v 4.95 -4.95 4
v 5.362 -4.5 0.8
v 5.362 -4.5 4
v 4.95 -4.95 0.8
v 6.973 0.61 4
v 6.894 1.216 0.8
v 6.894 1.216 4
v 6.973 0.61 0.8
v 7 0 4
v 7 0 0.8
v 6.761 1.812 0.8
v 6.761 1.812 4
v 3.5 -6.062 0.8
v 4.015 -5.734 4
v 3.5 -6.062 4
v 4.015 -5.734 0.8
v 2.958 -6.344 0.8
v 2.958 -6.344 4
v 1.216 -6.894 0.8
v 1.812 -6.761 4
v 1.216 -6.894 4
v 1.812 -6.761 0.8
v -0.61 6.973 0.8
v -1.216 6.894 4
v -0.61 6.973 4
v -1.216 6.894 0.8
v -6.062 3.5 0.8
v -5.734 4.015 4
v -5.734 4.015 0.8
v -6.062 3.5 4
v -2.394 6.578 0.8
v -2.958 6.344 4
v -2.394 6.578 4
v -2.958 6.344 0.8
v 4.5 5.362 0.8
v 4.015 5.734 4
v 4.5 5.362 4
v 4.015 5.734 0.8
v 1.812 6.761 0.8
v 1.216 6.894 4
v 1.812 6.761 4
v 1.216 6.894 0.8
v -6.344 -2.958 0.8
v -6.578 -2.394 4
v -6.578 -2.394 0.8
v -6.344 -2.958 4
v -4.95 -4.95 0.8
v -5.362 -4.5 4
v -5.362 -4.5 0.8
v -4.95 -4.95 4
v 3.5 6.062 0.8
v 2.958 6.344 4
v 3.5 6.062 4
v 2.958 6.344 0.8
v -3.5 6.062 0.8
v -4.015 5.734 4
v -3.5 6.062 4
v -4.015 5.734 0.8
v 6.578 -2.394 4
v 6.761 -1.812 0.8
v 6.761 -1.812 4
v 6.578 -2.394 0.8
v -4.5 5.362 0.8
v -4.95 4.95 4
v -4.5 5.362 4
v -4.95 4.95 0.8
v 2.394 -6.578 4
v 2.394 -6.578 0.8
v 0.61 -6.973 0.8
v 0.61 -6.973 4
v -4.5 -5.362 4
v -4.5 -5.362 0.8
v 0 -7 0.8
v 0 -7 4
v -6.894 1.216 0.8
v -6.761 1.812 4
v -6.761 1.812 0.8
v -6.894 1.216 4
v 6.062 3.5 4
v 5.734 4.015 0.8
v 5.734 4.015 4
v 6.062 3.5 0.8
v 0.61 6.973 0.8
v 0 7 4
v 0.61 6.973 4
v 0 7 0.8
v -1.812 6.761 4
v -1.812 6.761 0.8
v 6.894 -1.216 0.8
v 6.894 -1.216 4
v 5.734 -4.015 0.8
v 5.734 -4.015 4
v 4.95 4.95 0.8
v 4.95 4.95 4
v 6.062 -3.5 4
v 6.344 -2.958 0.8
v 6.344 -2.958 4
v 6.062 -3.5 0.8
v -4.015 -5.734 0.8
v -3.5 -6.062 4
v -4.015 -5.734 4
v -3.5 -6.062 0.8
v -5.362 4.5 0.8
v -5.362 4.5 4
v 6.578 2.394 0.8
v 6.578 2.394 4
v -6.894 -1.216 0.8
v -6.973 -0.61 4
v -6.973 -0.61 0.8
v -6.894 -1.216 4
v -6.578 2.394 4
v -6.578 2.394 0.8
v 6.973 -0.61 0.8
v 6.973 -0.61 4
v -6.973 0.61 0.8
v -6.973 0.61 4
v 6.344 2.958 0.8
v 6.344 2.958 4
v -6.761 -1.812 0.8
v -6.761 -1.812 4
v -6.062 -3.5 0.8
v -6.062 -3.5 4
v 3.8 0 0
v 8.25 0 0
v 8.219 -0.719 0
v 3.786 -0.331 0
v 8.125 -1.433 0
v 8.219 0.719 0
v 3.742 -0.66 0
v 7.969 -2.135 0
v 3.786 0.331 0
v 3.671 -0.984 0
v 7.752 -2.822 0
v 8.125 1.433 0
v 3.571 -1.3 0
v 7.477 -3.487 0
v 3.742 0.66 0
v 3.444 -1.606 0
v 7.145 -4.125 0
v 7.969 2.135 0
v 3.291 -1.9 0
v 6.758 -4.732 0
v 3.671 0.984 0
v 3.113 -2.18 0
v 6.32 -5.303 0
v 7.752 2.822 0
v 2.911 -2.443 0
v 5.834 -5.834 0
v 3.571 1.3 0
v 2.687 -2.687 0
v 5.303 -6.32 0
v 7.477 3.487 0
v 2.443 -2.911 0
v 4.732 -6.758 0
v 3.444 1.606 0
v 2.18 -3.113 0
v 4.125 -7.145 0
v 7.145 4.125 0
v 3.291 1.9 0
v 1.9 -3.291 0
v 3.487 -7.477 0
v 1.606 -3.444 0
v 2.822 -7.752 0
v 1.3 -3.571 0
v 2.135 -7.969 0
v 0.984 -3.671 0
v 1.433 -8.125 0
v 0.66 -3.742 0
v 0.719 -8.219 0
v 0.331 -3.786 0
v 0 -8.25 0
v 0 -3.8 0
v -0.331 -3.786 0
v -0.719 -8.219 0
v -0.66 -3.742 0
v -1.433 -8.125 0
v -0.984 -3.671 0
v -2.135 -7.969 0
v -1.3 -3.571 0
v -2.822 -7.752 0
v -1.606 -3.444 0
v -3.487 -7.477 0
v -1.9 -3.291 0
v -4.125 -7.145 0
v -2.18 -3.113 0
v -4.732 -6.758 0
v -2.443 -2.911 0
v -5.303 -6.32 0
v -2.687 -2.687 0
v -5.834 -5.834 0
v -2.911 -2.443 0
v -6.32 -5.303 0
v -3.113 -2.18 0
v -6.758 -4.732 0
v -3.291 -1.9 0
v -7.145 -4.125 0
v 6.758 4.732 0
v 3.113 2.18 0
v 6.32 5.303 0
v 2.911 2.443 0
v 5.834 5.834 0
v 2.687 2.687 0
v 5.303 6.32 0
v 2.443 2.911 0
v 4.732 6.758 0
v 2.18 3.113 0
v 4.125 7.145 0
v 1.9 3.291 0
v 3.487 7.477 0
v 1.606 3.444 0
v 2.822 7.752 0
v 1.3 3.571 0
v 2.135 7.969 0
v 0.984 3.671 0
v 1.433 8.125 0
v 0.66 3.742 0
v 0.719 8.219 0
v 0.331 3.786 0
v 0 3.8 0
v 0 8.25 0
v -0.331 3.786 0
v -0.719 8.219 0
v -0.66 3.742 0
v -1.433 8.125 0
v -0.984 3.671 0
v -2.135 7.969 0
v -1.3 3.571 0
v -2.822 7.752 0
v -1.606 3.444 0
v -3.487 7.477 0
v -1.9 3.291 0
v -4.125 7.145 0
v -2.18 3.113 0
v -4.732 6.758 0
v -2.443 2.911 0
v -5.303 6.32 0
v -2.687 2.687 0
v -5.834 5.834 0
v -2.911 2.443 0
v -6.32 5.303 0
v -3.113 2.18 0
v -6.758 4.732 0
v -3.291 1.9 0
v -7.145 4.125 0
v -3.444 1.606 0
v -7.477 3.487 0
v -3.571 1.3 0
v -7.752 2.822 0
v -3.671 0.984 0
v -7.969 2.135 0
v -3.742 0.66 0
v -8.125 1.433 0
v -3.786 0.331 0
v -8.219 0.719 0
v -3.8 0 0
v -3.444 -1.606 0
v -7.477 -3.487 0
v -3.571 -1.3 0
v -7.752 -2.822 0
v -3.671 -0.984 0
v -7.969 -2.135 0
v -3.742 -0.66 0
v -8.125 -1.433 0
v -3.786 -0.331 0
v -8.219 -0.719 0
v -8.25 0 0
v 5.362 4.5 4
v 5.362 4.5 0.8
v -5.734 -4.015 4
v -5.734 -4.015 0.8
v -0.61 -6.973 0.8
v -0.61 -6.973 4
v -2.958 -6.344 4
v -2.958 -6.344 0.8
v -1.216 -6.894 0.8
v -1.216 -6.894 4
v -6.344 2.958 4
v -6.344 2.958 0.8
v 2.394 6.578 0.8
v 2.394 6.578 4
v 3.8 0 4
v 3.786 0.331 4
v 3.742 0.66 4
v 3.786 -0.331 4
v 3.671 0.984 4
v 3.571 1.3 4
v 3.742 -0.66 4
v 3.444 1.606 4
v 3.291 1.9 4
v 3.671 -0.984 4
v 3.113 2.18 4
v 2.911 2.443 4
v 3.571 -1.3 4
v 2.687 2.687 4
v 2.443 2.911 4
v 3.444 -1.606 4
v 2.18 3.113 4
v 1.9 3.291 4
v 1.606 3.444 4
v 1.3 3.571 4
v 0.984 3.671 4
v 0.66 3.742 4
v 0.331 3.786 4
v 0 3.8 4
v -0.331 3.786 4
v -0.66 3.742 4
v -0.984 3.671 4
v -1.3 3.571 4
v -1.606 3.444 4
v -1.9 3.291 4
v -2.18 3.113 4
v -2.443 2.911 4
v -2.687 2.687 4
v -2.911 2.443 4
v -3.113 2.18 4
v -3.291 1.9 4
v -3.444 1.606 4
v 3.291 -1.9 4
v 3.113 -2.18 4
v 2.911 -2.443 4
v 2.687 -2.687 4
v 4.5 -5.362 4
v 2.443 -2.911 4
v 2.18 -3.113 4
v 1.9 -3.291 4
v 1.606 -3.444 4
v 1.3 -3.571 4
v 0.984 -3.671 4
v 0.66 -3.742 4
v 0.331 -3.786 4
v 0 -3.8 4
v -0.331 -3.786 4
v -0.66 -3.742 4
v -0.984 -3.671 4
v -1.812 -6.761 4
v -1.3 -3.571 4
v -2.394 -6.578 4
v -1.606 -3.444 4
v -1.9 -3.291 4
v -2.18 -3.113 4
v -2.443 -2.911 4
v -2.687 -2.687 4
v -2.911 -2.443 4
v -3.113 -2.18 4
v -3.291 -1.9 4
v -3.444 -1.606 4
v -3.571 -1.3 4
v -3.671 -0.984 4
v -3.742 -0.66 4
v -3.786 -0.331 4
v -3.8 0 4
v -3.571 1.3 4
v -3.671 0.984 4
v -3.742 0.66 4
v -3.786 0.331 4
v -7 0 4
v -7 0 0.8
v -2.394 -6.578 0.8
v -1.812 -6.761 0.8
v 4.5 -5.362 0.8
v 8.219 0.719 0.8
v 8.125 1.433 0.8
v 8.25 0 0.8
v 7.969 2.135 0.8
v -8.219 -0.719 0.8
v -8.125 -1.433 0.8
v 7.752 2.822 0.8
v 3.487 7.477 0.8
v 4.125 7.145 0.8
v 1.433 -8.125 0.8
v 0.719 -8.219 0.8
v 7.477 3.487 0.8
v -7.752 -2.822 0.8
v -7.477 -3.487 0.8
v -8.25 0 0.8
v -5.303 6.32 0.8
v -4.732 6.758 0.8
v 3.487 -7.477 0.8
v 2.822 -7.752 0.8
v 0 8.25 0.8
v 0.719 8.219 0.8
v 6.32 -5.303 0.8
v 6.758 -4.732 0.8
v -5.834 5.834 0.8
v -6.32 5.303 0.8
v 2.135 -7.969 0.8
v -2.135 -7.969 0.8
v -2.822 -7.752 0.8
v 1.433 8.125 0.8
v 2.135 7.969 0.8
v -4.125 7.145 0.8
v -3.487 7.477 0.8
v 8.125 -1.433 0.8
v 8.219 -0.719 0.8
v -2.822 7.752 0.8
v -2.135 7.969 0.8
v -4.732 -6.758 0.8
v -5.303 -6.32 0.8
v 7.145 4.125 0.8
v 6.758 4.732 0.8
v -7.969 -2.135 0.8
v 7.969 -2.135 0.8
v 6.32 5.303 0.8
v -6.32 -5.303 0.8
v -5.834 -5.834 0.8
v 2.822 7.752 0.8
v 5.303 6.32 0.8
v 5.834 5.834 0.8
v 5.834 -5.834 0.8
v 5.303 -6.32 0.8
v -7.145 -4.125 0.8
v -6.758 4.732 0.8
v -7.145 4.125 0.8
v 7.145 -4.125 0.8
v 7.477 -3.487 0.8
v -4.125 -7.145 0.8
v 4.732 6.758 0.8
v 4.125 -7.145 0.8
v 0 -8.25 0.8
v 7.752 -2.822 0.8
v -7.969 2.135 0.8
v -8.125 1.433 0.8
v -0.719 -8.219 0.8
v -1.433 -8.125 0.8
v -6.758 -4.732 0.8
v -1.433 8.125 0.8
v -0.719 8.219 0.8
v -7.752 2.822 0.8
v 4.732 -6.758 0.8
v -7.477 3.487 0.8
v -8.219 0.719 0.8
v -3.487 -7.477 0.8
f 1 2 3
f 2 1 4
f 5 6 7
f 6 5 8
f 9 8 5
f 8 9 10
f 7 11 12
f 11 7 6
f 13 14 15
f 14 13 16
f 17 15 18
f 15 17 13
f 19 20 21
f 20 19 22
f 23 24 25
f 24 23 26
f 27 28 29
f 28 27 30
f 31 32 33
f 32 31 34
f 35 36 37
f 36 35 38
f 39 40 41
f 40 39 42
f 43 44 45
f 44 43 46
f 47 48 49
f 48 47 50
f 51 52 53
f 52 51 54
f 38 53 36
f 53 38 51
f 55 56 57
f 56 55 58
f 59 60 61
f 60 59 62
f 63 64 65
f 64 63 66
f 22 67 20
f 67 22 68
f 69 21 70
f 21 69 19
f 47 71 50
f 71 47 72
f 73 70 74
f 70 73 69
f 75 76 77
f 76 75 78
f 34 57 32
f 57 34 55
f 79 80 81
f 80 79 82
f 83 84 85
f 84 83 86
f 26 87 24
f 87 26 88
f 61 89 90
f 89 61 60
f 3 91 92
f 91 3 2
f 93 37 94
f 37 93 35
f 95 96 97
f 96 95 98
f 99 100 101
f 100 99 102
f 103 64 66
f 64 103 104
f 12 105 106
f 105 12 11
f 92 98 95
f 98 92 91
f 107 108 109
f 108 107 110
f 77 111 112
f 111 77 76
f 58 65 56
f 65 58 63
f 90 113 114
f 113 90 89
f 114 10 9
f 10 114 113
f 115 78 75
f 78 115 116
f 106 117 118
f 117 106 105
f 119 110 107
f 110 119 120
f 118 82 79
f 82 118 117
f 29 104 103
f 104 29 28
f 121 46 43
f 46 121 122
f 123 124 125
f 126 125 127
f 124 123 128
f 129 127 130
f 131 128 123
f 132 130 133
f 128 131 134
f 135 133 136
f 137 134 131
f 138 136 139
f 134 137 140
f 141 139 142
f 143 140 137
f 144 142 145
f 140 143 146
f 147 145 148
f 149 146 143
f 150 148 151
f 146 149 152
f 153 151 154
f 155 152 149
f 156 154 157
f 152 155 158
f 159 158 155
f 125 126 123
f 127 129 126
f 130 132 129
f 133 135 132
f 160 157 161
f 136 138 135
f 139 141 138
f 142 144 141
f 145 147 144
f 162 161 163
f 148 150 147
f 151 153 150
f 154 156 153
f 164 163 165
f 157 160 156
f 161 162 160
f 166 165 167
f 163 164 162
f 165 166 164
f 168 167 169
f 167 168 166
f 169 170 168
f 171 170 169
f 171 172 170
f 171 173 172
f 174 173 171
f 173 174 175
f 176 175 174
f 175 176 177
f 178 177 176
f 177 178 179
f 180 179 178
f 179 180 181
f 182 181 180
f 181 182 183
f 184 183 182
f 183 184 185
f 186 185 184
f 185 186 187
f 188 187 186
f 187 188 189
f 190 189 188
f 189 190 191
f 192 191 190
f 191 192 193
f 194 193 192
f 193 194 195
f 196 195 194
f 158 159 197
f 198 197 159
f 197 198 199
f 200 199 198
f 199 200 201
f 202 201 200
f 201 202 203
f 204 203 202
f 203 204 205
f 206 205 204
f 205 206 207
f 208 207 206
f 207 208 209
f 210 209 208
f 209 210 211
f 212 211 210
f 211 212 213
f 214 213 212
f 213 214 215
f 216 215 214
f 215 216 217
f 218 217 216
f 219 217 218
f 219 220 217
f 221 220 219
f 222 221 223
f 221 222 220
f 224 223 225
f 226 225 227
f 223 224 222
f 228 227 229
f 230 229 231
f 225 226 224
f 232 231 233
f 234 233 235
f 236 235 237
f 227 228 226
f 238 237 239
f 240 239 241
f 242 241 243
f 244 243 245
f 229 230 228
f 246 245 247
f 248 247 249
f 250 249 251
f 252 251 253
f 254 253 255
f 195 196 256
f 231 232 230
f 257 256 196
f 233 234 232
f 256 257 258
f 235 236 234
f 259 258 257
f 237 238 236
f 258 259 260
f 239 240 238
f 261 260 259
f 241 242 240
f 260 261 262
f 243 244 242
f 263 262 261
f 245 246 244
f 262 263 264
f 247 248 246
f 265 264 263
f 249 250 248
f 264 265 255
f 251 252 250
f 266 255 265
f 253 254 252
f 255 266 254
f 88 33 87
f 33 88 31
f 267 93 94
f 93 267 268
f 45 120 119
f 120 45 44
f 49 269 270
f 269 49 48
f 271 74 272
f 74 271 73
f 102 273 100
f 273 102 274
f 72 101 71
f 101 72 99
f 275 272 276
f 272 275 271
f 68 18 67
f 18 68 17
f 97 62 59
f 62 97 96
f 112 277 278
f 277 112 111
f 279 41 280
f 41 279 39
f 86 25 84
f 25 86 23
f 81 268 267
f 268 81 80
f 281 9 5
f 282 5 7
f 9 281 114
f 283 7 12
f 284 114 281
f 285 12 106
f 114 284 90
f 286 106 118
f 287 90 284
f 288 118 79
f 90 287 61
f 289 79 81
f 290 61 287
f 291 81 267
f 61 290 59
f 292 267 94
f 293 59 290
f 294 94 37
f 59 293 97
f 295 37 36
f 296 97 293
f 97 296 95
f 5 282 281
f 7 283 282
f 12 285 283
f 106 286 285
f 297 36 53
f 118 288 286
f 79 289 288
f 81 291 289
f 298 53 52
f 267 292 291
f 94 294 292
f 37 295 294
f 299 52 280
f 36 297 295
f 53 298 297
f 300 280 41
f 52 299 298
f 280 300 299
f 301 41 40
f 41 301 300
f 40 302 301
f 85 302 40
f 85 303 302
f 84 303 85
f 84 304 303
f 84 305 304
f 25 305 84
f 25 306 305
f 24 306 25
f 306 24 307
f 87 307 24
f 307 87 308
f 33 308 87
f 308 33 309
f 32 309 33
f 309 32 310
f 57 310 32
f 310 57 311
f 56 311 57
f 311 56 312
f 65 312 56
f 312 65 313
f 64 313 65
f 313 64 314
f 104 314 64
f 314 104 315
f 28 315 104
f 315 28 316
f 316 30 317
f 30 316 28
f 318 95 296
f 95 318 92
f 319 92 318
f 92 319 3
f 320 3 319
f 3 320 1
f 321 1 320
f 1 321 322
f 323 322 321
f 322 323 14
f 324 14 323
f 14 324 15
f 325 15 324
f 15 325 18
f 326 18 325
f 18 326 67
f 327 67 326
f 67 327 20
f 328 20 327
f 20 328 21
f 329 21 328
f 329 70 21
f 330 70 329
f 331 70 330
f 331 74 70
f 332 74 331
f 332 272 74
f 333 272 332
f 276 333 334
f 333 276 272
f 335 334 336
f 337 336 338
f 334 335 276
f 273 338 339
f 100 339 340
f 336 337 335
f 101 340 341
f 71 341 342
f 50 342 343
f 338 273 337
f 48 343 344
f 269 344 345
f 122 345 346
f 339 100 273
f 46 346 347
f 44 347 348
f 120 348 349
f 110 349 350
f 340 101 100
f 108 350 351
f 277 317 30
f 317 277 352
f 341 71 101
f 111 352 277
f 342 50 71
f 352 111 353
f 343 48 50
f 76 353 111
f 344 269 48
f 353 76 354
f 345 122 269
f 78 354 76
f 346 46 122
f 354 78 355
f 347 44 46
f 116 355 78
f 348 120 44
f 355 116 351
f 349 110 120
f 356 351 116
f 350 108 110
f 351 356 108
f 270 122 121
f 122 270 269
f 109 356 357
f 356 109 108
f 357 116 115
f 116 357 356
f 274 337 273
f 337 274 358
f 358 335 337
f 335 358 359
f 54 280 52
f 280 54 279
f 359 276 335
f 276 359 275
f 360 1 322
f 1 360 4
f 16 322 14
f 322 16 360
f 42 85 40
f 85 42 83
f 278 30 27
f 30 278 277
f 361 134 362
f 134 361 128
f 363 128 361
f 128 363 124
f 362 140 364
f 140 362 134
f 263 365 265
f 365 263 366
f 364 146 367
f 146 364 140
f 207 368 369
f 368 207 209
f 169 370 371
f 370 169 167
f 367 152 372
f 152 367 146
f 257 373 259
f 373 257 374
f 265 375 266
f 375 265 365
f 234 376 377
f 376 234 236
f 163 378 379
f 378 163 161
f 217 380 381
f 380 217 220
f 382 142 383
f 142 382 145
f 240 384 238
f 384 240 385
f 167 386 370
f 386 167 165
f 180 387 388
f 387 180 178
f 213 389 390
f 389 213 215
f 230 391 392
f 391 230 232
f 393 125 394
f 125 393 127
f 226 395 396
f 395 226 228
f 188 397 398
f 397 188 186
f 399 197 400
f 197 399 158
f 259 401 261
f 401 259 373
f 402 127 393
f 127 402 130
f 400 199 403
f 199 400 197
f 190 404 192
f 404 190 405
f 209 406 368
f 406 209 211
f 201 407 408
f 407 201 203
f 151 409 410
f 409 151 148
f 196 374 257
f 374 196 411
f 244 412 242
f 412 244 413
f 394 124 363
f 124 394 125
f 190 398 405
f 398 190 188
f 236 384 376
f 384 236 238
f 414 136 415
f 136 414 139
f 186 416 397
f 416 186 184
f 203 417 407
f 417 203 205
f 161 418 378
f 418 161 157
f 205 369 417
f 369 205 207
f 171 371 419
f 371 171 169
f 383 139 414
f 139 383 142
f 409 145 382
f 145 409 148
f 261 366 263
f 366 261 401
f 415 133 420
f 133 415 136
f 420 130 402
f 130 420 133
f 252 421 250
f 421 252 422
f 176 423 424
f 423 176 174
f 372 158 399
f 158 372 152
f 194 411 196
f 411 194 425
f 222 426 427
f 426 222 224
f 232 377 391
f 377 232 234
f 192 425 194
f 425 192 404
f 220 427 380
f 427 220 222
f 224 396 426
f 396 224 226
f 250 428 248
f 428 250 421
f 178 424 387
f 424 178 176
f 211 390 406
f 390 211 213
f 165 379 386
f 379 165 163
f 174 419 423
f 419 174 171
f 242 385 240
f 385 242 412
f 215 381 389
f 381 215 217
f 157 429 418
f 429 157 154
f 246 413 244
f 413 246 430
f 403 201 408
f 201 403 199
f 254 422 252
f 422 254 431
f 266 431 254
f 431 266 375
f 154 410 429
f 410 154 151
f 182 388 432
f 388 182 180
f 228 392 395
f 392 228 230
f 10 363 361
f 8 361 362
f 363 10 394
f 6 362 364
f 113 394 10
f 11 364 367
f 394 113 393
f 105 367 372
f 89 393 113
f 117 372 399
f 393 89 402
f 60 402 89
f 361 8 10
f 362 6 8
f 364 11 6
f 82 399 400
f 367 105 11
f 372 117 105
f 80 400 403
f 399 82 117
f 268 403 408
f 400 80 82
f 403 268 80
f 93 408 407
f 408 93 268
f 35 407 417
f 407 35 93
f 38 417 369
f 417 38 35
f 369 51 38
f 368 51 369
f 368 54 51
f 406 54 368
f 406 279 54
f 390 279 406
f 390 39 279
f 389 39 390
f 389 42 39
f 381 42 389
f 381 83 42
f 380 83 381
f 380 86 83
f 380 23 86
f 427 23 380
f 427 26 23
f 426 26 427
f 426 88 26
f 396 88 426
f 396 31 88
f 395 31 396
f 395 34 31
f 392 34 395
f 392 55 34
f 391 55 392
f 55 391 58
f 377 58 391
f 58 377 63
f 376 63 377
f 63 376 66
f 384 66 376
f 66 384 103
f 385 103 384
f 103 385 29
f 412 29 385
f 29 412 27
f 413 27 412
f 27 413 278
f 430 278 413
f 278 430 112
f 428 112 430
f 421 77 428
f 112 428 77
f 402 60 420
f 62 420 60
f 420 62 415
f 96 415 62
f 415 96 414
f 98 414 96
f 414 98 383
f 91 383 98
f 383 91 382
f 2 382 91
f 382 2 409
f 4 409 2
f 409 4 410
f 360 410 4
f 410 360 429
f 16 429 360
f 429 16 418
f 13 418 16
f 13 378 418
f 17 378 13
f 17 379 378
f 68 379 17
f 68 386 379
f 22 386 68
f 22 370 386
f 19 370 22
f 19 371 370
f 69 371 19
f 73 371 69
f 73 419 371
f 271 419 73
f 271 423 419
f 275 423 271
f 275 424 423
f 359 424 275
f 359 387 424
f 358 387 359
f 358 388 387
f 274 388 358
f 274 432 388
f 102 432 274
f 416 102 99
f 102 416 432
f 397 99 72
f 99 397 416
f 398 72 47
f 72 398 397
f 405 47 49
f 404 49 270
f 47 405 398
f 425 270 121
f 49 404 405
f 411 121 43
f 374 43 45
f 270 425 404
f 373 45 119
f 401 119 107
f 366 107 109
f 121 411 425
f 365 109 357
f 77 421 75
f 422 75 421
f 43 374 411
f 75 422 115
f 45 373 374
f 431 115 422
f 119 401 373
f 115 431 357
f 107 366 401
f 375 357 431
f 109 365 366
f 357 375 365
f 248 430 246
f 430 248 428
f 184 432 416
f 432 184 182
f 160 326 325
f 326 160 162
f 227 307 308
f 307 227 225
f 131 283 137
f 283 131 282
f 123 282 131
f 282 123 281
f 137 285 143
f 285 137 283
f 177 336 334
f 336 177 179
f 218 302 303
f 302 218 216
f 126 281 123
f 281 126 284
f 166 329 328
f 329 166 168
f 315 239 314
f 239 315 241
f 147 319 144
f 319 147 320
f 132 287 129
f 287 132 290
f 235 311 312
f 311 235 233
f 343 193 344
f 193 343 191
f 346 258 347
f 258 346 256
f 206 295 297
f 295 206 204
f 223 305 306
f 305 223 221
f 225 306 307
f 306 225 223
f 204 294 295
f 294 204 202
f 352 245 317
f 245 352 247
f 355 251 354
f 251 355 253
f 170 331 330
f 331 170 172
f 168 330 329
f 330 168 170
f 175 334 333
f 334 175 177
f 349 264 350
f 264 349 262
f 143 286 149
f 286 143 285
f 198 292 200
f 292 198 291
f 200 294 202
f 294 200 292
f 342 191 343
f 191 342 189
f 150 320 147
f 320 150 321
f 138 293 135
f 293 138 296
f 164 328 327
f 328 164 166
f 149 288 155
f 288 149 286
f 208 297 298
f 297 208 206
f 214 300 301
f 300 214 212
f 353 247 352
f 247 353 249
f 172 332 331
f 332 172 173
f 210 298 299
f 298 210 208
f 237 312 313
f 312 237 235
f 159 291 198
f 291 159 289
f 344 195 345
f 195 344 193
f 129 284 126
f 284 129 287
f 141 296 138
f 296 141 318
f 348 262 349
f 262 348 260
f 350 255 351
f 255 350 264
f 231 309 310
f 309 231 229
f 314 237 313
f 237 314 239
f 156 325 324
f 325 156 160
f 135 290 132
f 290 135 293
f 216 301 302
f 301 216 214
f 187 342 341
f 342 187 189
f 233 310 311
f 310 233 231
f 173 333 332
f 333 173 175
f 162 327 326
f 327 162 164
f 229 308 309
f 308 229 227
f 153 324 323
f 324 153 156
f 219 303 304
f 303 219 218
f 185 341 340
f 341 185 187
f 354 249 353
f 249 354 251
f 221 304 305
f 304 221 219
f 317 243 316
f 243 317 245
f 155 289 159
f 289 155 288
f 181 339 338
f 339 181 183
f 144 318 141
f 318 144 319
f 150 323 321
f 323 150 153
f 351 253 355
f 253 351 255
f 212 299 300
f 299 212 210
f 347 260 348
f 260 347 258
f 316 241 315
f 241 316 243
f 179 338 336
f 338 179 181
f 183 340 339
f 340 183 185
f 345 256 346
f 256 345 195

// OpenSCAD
// file: param.scad
$fa = 5; //5  minimum=0.01
$fs = 0.1; //0.1  minimum=0.01

/////base params
R = 24;
r = 3;
l = 1.8; //eccentric shaft dist

/////roter
ecce = 1.8;
d_ecceshaft = 7.6;
l_eccesleeve_h = 0.5;
l_roter_thick = 3.5;
d_eccebearing = 14;
d_eccebearing_fr = 16.5;
l_eccebearing_h = 4;
l_eccebearing_fr = 0.8;


/////motor shaft
d_motshaft = 5;
l_motshaft = 8;//13;
l_motshafthld = l_motshaft+7;
l_motecceshaft = l_motshaft+11.7;

d_shaftholder = 10;


/////outer-pole
//spacer 3x6x5
d_pole = 6;
l_pole = 5;
d_pole_hole = 3.5;

d_pole_position = (R+r)*2;
ROTER2OUTERPIN_GAP = 0.15;


/////bottom-plate
l_bottmoplate_h = 4;

/////outpin
th_outp_angle = 22.5;
d_outp_position = 30;
d_outp_diameter = 3;



/////output-roter
d_output_hole = (d_outp_diameter/2 + l)*2;
l_output_h = 4;
// main file
include <param.scad>

difference(){
    union(){
        cylinder(h=l_eccebearing_h,r=d_eccebearing/2);
        cylinder(h=l_eccebearing_fr,r=d_eccebearing_fr/2);
    }
    cylinder(h=l_eccebearing_h,r=d_ecceshaft/2);
}
